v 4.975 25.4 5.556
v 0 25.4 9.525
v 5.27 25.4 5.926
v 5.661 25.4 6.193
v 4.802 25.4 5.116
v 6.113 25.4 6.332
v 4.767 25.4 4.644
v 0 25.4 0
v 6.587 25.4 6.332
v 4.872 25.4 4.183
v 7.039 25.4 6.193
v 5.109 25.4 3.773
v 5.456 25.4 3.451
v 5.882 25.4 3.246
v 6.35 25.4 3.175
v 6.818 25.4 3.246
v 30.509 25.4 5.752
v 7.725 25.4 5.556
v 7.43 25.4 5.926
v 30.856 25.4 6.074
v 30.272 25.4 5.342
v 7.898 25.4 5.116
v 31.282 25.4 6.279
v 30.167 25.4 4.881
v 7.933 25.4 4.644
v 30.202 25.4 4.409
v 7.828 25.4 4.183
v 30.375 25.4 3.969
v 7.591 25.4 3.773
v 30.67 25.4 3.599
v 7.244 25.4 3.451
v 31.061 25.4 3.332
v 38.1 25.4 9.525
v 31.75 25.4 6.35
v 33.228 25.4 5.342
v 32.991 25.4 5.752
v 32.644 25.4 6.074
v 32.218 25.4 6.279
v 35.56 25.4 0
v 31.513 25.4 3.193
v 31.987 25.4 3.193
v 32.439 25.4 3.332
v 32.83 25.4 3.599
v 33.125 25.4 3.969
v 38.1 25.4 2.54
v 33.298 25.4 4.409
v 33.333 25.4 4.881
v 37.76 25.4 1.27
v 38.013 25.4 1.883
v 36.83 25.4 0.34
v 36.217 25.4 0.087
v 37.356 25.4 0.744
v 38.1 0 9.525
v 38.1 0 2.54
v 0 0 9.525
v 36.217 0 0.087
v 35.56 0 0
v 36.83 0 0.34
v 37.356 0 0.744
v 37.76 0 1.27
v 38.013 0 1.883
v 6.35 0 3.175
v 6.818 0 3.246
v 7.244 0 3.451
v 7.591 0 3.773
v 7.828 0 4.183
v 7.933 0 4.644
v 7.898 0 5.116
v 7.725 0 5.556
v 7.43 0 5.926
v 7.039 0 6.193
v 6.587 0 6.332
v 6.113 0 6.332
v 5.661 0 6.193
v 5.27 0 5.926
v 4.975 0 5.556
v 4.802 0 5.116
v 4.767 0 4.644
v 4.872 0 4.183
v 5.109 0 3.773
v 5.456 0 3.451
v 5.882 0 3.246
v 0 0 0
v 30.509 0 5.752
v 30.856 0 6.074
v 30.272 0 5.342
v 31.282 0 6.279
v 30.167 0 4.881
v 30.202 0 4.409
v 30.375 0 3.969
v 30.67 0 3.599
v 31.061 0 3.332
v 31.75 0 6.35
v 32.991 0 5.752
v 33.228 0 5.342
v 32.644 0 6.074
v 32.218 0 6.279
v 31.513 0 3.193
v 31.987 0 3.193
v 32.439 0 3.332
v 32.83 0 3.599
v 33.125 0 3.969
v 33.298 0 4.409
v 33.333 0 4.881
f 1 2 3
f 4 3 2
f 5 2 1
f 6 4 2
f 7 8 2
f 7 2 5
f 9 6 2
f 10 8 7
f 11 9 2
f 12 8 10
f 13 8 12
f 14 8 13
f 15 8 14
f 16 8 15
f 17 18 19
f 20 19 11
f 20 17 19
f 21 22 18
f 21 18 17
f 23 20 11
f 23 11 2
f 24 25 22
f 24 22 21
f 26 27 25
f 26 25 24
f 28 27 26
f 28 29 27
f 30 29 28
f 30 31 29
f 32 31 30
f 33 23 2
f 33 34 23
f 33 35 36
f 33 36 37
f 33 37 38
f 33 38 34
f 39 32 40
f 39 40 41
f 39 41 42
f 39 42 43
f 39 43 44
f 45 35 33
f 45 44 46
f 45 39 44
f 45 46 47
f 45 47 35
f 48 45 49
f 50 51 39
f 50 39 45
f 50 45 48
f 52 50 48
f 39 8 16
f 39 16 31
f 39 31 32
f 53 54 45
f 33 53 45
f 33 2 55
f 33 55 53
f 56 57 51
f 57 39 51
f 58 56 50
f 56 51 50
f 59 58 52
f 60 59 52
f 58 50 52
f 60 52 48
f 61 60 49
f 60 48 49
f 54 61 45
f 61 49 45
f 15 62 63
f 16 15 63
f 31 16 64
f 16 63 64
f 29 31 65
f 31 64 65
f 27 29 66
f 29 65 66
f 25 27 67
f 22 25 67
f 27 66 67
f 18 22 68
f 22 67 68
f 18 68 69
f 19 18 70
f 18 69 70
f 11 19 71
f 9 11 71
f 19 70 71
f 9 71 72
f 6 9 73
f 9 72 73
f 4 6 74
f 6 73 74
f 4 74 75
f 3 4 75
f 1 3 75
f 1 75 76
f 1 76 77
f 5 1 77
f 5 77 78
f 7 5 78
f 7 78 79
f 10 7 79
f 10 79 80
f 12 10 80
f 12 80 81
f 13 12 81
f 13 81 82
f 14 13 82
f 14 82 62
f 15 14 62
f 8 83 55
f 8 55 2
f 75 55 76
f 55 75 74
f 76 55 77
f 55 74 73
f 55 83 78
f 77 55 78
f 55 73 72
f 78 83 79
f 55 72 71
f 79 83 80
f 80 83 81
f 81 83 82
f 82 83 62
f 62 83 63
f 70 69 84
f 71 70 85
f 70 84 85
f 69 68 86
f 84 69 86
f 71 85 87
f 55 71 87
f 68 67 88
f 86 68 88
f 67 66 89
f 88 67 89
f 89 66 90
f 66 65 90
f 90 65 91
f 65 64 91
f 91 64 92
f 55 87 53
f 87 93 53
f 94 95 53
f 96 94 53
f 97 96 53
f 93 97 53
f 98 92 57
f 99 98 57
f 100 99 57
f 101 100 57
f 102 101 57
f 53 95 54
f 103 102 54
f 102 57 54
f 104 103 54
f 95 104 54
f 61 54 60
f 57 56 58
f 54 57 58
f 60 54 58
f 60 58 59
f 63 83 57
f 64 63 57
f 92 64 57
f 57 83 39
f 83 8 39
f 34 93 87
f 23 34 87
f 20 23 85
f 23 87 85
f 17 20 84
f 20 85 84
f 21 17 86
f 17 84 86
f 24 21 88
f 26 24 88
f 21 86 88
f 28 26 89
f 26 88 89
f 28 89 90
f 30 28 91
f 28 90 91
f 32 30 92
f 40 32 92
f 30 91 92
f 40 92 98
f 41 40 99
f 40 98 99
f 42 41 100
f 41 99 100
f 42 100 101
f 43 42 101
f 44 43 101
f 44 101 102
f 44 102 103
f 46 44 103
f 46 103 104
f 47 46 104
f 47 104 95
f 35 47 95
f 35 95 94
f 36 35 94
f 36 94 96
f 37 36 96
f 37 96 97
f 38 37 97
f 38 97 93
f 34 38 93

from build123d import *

# Parameters (mm, degrees)
SKETCH1_W           = 38.1
SKETCH1_H           = 25.4
BOSS_EXTRUDE1_DEPTH = 9.525
SKETCH2_R           = 1.5875
CUT_EXTRUDE1_DEPTH  = 47.770670564
FILLET1_R           = 2.54


with BuildPart() as part:
    # Sketch1 → Boss-Extrude1 (new body)
    with BuildSketch(Plane.XY):
        with Locations((19.05, 12.7)):
            Rectangle(SKETCH1_W, SKETCH1_H)
    extrude(amount=BOSS_EXTRUDE1_DEPTH)

    # Sketch2 → Cut-Extrude1 (cut, through all)
    with BuildSketch(Plane.XZ):
        with Locations(Location((6.35, 4.7625, 0), (0, 0, 270))):
            Circle(SKETCH2_R)
        with Locations(Location((31.75, 4.7625, 0), (0, 0, 90))):
            Circle(SKETCH2_R)
    extrude(amount=-CUT_EXTRUDE1_DEPTH, mode=Mode.SUBTRACT)

    # Fillet1
    fillet1_edges = [part.edges().sort_by_distance(p)[0] for p in [
        (38.1, 12.7, 0),
    ]]
    fillet(fillet1_edges, radius=FILLET1_R)


solid = part.part
